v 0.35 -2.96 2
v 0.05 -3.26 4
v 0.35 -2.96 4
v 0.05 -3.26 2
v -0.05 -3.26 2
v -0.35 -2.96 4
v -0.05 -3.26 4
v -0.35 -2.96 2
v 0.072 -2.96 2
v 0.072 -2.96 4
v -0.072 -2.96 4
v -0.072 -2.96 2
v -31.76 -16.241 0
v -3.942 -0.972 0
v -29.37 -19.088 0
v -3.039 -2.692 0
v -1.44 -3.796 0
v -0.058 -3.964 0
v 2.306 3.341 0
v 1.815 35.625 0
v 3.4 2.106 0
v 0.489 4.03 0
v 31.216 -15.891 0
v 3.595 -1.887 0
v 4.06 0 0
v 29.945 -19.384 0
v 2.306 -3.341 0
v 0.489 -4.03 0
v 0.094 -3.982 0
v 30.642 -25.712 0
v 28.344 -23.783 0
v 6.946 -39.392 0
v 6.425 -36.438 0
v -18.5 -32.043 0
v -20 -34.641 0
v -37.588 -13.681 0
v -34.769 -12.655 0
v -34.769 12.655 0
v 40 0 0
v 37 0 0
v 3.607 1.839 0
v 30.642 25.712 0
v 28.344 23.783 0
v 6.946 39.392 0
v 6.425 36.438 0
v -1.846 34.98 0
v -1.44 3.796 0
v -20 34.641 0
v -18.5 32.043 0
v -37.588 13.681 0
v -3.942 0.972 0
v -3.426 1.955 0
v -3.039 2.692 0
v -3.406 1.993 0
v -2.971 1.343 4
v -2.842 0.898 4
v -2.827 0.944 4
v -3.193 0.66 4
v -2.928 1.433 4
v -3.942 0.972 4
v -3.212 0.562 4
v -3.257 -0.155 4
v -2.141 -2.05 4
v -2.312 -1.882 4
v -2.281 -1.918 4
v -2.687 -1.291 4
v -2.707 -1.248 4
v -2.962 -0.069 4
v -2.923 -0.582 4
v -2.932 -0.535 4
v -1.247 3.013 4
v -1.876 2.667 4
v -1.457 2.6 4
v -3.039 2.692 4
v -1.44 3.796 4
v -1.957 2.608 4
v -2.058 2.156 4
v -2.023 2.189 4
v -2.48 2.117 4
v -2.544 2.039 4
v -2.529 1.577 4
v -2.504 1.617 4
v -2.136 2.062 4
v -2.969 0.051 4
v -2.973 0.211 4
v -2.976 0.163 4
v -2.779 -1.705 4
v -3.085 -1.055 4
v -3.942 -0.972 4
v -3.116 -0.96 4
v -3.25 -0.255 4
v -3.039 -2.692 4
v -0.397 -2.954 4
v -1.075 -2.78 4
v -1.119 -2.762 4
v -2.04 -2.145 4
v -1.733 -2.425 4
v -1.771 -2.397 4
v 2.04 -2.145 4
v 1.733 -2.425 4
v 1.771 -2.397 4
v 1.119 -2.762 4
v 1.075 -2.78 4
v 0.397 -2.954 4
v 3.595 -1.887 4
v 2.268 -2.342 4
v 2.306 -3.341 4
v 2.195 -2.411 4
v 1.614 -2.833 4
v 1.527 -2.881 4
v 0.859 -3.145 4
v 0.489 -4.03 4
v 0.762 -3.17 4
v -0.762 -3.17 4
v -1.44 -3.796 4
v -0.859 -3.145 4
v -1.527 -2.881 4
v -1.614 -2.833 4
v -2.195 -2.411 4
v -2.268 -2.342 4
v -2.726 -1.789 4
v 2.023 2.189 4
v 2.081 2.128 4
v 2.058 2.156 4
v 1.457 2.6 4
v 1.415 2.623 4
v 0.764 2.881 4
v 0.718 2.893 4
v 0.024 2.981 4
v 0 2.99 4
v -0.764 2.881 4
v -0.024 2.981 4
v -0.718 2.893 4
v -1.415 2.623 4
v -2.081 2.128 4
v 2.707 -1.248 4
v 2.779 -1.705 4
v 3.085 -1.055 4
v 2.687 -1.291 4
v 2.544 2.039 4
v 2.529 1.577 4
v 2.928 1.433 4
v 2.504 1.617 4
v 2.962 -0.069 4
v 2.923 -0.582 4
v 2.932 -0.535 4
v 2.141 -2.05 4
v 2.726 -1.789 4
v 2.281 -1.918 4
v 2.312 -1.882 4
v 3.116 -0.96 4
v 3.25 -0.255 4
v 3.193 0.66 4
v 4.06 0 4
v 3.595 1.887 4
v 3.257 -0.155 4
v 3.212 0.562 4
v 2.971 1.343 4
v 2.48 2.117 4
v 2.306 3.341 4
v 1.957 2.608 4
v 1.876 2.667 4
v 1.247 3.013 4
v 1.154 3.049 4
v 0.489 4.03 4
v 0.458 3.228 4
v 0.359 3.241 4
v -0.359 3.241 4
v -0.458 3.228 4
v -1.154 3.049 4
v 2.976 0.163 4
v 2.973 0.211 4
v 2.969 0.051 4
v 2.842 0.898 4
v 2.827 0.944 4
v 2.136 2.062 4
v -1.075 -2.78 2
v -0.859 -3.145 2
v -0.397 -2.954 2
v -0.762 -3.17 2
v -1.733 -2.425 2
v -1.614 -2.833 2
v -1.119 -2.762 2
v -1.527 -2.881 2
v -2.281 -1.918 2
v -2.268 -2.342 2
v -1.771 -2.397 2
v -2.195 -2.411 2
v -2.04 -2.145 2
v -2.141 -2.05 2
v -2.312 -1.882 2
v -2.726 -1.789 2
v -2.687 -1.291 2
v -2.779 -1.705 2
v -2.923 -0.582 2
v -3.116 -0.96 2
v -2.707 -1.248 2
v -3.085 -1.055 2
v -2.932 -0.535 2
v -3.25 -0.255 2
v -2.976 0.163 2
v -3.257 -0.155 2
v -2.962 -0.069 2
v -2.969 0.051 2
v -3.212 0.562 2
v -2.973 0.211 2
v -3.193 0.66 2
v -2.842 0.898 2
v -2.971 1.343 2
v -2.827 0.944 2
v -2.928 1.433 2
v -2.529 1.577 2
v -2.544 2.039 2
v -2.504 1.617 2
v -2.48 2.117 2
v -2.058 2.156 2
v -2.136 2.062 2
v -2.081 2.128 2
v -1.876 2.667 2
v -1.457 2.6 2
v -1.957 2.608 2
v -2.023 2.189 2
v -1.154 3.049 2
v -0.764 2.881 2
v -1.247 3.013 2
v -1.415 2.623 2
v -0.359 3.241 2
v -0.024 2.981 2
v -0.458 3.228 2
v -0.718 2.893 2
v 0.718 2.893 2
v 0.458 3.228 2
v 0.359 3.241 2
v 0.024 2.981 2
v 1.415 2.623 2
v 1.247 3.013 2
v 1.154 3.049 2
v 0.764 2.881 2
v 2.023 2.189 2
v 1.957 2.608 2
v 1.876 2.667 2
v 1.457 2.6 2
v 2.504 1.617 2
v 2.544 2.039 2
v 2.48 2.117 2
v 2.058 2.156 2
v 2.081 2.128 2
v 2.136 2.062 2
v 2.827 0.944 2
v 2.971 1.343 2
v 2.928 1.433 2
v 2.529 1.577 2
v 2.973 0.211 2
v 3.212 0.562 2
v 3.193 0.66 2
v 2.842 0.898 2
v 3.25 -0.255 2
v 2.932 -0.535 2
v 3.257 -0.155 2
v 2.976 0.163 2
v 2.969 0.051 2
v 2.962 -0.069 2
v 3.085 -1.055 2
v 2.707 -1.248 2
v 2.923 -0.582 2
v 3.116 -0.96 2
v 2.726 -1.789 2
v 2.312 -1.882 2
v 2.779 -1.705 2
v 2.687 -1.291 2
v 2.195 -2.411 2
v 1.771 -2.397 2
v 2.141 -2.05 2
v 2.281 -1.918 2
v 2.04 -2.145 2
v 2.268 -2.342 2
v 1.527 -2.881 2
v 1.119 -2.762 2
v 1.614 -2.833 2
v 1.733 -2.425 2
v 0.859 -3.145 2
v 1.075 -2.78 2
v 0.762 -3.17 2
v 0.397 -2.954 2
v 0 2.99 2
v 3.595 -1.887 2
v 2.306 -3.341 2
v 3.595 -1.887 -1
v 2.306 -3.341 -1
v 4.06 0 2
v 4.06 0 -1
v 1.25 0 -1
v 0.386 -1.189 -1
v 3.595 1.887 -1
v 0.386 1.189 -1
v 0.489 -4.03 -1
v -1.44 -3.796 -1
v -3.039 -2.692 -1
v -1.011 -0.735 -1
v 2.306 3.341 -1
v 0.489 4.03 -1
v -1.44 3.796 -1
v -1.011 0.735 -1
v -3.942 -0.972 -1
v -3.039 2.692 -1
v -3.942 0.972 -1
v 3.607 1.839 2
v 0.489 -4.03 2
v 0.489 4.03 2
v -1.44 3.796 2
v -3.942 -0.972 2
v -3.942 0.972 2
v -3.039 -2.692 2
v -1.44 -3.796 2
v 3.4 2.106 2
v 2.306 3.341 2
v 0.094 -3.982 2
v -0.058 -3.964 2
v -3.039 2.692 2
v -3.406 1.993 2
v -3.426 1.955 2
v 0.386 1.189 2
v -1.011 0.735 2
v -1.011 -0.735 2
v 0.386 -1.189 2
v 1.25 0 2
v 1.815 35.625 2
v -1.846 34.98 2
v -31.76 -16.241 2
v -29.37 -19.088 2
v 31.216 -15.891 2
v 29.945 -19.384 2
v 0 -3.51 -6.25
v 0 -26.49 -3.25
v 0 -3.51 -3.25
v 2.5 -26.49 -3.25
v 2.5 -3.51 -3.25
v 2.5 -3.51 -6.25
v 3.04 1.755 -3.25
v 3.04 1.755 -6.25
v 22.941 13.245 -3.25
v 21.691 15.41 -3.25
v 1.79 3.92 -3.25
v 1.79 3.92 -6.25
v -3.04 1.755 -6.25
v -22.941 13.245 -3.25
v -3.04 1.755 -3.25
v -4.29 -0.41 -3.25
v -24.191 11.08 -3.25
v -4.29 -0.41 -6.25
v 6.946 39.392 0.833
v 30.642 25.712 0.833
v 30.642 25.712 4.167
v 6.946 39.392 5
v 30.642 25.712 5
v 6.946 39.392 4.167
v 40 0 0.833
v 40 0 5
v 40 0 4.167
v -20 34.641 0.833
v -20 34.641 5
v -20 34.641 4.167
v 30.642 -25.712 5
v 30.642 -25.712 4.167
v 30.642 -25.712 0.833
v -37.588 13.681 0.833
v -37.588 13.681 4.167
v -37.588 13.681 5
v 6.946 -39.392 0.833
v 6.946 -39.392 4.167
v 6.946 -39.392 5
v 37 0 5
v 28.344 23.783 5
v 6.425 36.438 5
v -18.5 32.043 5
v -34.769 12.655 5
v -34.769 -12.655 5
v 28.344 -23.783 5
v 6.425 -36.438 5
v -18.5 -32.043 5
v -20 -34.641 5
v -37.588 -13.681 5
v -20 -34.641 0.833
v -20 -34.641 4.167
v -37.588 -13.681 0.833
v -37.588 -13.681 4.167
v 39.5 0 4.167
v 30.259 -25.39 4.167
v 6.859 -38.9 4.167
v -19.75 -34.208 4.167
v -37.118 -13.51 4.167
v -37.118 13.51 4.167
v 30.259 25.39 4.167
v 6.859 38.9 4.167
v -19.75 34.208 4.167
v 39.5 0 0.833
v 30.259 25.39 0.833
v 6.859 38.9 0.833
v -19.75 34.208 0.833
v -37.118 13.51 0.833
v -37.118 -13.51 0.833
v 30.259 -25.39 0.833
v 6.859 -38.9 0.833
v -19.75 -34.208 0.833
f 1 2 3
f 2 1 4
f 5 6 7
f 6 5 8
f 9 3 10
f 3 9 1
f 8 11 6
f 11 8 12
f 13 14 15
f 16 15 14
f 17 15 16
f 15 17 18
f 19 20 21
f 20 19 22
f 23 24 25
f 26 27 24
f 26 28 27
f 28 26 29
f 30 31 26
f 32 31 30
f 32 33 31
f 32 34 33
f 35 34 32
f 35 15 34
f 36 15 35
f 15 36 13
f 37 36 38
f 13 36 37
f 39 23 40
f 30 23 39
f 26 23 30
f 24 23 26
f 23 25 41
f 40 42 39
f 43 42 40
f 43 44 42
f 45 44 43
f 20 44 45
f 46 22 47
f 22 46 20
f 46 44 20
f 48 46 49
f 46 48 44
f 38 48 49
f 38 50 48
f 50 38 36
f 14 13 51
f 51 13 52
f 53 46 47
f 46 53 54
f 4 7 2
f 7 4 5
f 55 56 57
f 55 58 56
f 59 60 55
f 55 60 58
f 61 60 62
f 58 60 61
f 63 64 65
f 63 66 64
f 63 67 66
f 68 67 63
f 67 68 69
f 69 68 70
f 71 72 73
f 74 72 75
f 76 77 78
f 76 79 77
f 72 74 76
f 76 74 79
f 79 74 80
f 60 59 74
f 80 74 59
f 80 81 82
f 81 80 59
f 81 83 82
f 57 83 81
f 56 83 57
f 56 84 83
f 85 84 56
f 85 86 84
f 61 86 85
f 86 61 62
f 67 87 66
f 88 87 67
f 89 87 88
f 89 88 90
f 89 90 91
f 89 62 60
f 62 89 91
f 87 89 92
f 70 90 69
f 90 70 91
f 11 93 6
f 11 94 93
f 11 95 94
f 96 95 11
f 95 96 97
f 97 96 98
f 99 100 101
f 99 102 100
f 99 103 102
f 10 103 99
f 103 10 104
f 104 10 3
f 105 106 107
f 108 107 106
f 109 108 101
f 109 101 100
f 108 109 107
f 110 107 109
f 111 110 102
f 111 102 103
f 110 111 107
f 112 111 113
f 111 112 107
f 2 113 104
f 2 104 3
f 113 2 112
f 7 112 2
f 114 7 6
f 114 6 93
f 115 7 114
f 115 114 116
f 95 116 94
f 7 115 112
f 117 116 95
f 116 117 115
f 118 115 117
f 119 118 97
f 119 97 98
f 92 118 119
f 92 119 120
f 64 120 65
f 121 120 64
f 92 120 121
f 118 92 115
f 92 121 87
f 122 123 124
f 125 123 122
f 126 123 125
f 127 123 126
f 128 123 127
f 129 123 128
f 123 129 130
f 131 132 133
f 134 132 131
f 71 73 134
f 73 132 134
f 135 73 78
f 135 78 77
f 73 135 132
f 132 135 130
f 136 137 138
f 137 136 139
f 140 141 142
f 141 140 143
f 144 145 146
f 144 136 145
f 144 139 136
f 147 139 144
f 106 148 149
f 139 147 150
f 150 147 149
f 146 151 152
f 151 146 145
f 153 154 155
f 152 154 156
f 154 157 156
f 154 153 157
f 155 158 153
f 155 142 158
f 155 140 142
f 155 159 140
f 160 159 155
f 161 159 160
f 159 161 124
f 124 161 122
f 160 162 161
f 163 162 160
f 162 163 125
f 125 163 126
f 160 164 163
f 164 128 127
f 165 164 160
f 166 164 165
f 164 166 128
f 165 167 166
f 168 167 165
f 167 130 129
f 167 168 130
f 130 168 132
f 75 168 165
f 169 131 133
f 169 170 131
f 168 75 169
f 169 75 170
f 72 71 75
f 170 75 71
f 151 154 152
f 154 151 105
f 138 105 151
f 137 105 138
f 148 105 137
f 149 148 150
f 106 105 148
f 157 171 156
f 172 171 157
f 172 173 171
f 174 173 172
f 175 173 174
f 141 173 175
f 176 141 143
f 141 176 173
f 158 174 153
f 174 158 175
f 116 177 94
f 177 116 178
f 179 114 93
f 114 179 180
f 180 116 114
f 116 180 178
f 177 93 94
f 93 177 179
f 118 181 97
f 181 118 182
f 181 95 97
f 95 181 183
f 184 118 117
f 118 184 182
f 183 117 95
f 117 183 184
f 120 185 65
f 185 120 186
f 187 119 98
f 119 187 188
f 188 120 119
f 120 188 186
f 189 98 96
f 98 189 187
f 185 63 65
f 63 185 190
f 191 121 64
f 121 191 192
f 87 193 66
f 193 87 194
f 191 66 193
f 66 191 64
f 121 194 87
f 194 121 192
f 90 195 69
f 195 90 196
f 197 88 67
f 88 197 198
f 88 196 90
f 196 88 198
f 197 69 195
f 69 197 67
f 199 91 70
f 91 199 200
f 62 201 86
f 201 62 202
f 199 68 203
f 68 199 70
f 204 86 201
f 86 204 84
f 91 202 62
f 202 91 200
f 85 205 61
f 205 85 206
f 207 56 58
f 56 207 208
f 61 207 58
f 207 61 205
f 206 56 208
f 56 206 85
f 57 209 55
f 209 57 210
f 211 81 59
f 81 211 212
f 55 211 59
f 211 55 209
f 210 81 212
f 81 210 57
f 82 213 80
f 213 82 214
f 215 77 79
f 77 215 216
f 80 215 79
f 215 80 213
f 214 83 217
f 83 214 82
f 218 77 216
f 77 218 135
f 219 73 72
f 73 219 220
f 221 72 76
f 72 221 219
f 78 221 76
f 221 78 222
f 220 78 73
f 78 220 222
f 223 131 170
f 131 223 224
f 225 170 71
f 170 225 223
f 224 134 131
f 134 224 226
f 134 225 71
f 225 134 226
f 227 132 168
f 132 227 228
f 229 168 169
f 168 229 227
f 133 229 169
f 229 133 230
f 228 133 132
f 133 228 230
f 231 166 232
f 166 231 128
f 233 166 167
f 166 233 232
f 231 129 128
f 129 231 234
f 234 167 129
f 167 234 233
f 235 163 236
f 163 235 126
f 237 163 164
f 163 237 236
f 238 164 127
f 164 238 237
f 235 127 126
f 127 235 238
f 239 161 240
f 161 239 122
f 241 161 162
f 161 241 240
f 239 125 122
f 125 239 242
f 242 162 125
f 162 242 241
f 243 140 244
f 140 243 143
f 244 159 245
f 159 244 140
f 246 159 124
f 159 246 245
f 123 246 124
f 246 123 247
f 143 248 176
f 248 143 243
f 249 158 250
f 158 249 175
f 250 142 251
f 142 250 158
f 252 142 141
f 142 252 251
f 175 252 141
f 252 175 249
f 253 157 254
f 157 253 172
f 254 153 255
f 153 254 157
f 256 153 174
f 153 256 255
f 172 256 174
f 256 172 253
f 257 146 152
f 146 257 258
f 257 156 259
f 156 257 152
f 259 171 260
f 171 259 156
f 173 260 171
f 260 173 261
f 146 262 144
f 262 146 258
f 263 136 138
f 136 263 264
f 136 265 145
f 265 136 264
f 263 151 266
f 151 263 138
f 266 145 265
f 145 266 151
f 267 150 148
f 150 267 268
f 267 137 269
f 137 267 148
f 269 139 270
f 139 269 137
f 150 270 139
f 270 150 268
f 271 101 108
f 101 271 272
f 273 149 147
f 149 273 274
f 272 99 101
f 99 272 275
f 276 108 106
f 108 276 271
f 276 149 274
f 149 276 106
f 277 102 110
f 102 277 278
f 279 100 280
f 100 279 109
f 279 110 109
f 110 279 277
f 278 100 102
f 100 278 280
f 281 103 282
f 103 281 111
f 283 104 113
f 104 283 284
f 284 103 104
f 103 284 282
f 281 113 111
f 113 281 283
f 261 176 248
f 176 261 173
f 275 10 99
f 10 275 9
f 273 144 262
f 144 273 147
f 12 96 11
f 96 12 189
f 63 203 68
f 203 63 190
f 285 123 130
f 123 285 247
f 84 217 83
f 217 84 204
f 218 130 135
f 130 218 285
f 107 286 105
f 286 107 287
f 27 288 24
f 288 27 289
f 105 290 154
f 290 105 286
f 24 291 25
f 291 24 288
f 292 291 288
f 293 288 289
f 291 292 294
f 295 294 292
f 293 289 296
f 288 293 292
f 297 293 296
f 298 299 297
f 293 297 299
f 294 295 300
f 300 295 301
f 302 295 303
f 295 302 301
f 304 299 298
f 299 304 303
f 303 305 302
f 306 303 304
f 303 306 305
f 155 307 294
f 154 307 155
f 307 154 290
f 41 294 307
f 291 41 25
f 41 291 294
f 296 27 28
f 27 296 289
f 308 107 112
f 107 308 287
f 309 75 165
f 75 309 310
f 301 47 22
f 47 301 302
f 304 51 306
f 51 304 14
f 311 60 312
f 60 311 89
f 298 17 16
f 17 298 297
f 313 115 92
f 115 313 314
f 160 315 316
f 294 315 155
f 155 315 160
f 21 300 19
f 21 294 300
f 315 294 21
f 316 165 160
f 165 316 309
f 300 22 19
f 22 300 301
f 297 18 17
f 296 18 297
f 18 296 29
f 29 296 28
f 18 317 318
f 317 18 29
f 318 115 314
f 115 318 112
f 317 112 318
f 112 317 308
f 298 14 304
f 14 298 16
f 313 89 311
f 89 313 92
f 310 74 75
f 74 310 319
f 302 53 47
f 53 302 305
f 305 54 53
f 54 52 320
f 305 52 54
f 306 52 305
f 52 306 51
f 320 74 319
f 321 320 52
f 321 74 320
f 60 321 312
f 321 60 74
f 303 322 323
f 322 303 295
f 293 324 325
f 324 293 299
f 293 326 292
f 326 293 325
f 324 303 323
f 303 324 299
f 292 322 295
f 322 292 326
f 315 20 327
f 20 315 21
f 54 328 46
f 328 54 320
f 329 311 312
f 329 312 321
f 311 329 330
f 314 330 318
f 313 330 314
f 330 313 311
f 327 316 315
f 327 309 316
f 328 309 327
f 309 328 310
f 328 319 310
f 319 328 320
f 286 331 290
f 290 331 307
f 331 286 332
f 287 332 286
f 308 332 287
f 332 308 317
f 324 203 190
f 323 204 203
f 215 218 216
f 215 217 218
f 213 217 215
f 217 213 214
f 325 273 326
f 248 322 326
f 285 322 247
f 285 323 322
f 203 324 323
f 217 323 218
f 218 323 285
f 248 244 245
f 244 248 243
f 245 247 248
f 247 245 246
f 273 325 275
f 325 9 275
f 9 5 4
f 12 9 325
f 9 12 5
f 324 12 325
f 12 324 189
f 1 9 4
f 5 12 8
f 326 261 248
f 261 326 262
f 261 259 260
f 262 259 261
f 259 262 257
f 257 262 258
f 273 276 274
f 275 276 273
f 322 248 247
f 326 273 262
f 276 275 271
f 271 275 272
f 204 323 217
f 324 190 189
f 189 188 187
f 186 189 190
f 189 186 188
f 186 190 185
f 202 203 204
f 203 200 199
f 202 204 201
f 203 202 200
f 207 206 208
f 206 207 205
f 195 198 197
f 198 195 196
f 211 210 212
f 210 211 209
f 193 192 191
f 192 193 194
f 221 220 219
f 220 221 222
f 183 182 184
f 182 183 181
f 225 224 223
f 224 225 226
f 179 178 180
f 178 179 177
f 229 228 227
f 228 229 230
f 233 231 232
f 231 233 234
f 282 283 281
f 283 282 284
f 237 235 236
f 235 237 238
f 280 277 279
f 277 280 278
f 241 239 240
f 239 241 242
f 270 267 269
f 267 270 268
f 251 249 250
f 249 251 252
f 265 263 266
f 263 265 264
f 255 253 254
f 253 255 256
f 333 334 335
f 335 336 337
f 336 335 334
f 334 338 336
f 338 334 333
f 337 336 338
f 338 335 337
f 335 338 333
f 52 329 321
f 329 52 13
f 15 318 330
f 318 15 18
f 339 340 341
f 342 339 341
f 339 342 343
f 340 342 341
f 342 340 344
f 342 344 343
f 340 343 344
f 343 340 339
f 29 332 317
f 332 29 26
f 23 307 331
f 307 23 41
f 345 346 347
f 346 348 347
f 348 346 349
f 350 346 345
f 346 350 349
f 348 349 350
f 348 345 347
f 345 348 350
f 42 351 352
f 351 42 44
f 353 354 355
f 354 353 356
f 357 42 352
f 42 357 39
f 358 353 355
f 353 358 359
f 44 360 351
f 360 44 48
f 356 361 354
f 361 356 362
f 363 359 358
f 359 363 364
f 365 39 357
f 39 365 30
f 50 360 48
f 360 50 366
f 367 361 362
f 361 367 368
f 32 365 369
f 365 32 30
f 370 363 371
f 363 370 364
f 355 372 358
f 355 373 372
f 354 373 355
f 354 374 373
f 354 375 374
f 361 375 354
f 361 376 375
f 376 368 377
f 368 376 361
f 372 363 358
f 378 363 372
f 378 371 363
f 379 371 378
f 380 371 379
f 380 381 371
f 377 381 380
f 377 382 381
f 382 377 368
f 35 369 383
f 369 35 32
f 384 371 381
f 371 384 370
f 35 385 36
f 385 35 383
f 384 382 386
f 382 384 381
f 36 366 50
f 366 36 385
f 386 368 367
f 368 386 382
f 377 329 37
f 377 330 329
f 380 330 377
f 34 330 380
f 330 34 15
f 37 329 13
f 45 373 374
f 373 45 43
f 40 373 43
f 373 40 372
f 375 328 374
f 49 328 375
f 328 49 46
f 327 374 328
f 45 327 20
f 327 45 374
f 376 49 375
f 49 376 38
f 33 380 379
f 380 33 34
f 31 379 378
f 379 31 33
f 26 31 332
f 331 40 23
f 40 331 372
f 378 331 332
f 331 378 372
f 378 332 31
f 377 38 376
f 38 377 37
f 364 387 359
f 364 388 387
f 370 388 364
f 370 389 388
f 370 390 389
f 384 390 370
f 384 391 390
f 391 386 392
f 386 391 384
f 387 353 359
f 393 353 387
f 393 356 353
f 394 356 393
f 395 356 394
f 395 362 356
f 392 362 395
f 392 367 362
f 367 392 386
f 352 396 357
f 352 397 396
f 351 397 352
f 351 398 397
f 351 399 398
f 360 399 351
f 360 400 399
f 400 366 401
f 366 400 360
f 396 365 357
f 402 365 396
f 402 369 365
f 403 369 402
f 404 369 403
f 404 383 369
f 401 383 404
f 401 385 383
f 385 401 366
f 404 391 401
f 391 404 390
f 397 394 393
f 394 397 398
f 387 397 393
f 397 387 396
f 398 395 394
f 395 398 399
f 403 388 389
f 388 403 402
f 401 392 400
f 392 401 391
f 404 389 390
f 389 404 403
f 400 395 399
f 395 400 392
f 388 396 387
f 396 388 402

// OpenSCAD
clear = 0.3;

toothLength = 0.7;
toothWidth = 0.1;
toothHeight = 0.3;
toothCount = 25;
headHeight = 4;
headDiameter = 5.92;
headScrewDiameter = 2.5;
headThickness = 1.1;

numberOfArms = 3;
innerWidth = 7;
outerWidth = 3.5;
thickness = 2;
radius = 40;
ringThickness = 3;
wheelThickness = 5;

minorArmLength = radius * 0.75;
minorArmHeight = headHeight;
minorArmThickness = 2.5;

outerRingThickness = wheelThickness/3.0*2;
outerRingDepth = 0.5;

dt = 360.0 / numberOfArms;

module servoArm(innerWidth, outerWidth, thickness, radius, wheelThickness, minorArmThickness, minorArmLength, minorArmHeight) {

    linear_extrude(height = thickness)
        polygon(points = [
            [ -innerWidth * 0.5, 0 ],
            [ innerWidth * 0.5, 0 ],
            [ outerWidth * 0.5, radius - wheelThickness ],
            [ -outerWidth * 0.5, radius - wheelThickness ]
        ]);

        rotate(a = [ 0, 0, -90 ])
            translate(v = [ 0, 0, -minorArmThickness * 0.5])
                rotate(a = [ -90, 0, 0 ])
                    linear_extrude(height = minorArmThickness)
                        polygon(points = [
                            [ headDiameter * 0.5 + headThickness * 0.5, thickness ],
                            [ minorArmLength - headDiameter * 0.5 - headThickness * 0.5, thickness ],
                            [ headDiameter * 0.5 + headThickness * 0.5, minorArmHeight + thickness * 0.5 ]
                        ]);

}

radius2 = headDiameter / 2 - toothHeight + clear;

difference() {

    union() {
        difference() {

            union() {

                // SERVO-HEAD-FEMALE
                translate(v = [ 0, 0, headHeight ])
                rotate(a = [ 180, 0, 0 ])
                difference() {

                    cylinder(r1 = headDiameter / 2 + headThickness, r2 = headDiameter / 2 + headThickness, h = headHeight + 1, center=false);

                    cylinder(r1 = headScrewDiameter / 2, r2 = headScrewDiameter / 2, h = 10, center=false);

                    union() {
                        cylinder(r1 = radius2 + 0.03, r2 = radius2 + 0.03, h = headHeight, center = false, $fa = toothCount * 2);

                        for (i = [ 0 : toothCount-1 ]) {
                            rotate( a = [ 0, 0, i * (360.0 / toothCount)]) {
                                translate(v = [0, radius2, 0 ]) {
                                    linear_extrude(height = headHeight) {
                                        polygon(points = [
                                            [ -toothLength / 2, 0 ],
                                            [ toothLength / 2, 0 ],
                                            [ toothWidth / 2, toothHeight ],
                                            [ -toothWidth / 2, toothHeight ]
                                        ]);
                                    };
                                };
                            };
                        };
                    };

                };

                // ARMS
                for (i = [ 0 : numberOfArms - 1 ]) {
                    rotate(a = [ 0, 0, dt * i ])
                        servoArm(innerWidth = innerWidth, outerWidth = outerWidth, thickness = thickness,
                        radius = radius, wheelThickness = ringThickness, minorArmThickness = minorArmThickness,
                        minorArmLength = minorArmLength, minorArmHeight = minorArmHeight);
                };

            };

            cylinder(r1 = headScrewDiameter / 2.0, r2 = headScrewDiameter / 2.0, h = ringThickness * 2, center=false);

        };

        difference() {
            cylinder(r1 = radius, r2 = radius, h = wheelThickness, center=false, $fa=40);
            cylinder(r1 = radius - ringThickness, r2 = radius - ringThickness, h = wheelThickness, center=false, $fa=40);
        };

    };

    translate(v = [ 0, 0, wheelThickness*0.5-outerRingThickness*0.5])
        difference() {
            cylinder(r1 = radius, r2 = radius, h = outerRingThickness, center=false, $fa=40);
            cylinder(r1 = radius - outerRingDepth, r2 = radius - outerRingDepth, h = outerRingThickness, center=false, $fa=40);
        };

};
